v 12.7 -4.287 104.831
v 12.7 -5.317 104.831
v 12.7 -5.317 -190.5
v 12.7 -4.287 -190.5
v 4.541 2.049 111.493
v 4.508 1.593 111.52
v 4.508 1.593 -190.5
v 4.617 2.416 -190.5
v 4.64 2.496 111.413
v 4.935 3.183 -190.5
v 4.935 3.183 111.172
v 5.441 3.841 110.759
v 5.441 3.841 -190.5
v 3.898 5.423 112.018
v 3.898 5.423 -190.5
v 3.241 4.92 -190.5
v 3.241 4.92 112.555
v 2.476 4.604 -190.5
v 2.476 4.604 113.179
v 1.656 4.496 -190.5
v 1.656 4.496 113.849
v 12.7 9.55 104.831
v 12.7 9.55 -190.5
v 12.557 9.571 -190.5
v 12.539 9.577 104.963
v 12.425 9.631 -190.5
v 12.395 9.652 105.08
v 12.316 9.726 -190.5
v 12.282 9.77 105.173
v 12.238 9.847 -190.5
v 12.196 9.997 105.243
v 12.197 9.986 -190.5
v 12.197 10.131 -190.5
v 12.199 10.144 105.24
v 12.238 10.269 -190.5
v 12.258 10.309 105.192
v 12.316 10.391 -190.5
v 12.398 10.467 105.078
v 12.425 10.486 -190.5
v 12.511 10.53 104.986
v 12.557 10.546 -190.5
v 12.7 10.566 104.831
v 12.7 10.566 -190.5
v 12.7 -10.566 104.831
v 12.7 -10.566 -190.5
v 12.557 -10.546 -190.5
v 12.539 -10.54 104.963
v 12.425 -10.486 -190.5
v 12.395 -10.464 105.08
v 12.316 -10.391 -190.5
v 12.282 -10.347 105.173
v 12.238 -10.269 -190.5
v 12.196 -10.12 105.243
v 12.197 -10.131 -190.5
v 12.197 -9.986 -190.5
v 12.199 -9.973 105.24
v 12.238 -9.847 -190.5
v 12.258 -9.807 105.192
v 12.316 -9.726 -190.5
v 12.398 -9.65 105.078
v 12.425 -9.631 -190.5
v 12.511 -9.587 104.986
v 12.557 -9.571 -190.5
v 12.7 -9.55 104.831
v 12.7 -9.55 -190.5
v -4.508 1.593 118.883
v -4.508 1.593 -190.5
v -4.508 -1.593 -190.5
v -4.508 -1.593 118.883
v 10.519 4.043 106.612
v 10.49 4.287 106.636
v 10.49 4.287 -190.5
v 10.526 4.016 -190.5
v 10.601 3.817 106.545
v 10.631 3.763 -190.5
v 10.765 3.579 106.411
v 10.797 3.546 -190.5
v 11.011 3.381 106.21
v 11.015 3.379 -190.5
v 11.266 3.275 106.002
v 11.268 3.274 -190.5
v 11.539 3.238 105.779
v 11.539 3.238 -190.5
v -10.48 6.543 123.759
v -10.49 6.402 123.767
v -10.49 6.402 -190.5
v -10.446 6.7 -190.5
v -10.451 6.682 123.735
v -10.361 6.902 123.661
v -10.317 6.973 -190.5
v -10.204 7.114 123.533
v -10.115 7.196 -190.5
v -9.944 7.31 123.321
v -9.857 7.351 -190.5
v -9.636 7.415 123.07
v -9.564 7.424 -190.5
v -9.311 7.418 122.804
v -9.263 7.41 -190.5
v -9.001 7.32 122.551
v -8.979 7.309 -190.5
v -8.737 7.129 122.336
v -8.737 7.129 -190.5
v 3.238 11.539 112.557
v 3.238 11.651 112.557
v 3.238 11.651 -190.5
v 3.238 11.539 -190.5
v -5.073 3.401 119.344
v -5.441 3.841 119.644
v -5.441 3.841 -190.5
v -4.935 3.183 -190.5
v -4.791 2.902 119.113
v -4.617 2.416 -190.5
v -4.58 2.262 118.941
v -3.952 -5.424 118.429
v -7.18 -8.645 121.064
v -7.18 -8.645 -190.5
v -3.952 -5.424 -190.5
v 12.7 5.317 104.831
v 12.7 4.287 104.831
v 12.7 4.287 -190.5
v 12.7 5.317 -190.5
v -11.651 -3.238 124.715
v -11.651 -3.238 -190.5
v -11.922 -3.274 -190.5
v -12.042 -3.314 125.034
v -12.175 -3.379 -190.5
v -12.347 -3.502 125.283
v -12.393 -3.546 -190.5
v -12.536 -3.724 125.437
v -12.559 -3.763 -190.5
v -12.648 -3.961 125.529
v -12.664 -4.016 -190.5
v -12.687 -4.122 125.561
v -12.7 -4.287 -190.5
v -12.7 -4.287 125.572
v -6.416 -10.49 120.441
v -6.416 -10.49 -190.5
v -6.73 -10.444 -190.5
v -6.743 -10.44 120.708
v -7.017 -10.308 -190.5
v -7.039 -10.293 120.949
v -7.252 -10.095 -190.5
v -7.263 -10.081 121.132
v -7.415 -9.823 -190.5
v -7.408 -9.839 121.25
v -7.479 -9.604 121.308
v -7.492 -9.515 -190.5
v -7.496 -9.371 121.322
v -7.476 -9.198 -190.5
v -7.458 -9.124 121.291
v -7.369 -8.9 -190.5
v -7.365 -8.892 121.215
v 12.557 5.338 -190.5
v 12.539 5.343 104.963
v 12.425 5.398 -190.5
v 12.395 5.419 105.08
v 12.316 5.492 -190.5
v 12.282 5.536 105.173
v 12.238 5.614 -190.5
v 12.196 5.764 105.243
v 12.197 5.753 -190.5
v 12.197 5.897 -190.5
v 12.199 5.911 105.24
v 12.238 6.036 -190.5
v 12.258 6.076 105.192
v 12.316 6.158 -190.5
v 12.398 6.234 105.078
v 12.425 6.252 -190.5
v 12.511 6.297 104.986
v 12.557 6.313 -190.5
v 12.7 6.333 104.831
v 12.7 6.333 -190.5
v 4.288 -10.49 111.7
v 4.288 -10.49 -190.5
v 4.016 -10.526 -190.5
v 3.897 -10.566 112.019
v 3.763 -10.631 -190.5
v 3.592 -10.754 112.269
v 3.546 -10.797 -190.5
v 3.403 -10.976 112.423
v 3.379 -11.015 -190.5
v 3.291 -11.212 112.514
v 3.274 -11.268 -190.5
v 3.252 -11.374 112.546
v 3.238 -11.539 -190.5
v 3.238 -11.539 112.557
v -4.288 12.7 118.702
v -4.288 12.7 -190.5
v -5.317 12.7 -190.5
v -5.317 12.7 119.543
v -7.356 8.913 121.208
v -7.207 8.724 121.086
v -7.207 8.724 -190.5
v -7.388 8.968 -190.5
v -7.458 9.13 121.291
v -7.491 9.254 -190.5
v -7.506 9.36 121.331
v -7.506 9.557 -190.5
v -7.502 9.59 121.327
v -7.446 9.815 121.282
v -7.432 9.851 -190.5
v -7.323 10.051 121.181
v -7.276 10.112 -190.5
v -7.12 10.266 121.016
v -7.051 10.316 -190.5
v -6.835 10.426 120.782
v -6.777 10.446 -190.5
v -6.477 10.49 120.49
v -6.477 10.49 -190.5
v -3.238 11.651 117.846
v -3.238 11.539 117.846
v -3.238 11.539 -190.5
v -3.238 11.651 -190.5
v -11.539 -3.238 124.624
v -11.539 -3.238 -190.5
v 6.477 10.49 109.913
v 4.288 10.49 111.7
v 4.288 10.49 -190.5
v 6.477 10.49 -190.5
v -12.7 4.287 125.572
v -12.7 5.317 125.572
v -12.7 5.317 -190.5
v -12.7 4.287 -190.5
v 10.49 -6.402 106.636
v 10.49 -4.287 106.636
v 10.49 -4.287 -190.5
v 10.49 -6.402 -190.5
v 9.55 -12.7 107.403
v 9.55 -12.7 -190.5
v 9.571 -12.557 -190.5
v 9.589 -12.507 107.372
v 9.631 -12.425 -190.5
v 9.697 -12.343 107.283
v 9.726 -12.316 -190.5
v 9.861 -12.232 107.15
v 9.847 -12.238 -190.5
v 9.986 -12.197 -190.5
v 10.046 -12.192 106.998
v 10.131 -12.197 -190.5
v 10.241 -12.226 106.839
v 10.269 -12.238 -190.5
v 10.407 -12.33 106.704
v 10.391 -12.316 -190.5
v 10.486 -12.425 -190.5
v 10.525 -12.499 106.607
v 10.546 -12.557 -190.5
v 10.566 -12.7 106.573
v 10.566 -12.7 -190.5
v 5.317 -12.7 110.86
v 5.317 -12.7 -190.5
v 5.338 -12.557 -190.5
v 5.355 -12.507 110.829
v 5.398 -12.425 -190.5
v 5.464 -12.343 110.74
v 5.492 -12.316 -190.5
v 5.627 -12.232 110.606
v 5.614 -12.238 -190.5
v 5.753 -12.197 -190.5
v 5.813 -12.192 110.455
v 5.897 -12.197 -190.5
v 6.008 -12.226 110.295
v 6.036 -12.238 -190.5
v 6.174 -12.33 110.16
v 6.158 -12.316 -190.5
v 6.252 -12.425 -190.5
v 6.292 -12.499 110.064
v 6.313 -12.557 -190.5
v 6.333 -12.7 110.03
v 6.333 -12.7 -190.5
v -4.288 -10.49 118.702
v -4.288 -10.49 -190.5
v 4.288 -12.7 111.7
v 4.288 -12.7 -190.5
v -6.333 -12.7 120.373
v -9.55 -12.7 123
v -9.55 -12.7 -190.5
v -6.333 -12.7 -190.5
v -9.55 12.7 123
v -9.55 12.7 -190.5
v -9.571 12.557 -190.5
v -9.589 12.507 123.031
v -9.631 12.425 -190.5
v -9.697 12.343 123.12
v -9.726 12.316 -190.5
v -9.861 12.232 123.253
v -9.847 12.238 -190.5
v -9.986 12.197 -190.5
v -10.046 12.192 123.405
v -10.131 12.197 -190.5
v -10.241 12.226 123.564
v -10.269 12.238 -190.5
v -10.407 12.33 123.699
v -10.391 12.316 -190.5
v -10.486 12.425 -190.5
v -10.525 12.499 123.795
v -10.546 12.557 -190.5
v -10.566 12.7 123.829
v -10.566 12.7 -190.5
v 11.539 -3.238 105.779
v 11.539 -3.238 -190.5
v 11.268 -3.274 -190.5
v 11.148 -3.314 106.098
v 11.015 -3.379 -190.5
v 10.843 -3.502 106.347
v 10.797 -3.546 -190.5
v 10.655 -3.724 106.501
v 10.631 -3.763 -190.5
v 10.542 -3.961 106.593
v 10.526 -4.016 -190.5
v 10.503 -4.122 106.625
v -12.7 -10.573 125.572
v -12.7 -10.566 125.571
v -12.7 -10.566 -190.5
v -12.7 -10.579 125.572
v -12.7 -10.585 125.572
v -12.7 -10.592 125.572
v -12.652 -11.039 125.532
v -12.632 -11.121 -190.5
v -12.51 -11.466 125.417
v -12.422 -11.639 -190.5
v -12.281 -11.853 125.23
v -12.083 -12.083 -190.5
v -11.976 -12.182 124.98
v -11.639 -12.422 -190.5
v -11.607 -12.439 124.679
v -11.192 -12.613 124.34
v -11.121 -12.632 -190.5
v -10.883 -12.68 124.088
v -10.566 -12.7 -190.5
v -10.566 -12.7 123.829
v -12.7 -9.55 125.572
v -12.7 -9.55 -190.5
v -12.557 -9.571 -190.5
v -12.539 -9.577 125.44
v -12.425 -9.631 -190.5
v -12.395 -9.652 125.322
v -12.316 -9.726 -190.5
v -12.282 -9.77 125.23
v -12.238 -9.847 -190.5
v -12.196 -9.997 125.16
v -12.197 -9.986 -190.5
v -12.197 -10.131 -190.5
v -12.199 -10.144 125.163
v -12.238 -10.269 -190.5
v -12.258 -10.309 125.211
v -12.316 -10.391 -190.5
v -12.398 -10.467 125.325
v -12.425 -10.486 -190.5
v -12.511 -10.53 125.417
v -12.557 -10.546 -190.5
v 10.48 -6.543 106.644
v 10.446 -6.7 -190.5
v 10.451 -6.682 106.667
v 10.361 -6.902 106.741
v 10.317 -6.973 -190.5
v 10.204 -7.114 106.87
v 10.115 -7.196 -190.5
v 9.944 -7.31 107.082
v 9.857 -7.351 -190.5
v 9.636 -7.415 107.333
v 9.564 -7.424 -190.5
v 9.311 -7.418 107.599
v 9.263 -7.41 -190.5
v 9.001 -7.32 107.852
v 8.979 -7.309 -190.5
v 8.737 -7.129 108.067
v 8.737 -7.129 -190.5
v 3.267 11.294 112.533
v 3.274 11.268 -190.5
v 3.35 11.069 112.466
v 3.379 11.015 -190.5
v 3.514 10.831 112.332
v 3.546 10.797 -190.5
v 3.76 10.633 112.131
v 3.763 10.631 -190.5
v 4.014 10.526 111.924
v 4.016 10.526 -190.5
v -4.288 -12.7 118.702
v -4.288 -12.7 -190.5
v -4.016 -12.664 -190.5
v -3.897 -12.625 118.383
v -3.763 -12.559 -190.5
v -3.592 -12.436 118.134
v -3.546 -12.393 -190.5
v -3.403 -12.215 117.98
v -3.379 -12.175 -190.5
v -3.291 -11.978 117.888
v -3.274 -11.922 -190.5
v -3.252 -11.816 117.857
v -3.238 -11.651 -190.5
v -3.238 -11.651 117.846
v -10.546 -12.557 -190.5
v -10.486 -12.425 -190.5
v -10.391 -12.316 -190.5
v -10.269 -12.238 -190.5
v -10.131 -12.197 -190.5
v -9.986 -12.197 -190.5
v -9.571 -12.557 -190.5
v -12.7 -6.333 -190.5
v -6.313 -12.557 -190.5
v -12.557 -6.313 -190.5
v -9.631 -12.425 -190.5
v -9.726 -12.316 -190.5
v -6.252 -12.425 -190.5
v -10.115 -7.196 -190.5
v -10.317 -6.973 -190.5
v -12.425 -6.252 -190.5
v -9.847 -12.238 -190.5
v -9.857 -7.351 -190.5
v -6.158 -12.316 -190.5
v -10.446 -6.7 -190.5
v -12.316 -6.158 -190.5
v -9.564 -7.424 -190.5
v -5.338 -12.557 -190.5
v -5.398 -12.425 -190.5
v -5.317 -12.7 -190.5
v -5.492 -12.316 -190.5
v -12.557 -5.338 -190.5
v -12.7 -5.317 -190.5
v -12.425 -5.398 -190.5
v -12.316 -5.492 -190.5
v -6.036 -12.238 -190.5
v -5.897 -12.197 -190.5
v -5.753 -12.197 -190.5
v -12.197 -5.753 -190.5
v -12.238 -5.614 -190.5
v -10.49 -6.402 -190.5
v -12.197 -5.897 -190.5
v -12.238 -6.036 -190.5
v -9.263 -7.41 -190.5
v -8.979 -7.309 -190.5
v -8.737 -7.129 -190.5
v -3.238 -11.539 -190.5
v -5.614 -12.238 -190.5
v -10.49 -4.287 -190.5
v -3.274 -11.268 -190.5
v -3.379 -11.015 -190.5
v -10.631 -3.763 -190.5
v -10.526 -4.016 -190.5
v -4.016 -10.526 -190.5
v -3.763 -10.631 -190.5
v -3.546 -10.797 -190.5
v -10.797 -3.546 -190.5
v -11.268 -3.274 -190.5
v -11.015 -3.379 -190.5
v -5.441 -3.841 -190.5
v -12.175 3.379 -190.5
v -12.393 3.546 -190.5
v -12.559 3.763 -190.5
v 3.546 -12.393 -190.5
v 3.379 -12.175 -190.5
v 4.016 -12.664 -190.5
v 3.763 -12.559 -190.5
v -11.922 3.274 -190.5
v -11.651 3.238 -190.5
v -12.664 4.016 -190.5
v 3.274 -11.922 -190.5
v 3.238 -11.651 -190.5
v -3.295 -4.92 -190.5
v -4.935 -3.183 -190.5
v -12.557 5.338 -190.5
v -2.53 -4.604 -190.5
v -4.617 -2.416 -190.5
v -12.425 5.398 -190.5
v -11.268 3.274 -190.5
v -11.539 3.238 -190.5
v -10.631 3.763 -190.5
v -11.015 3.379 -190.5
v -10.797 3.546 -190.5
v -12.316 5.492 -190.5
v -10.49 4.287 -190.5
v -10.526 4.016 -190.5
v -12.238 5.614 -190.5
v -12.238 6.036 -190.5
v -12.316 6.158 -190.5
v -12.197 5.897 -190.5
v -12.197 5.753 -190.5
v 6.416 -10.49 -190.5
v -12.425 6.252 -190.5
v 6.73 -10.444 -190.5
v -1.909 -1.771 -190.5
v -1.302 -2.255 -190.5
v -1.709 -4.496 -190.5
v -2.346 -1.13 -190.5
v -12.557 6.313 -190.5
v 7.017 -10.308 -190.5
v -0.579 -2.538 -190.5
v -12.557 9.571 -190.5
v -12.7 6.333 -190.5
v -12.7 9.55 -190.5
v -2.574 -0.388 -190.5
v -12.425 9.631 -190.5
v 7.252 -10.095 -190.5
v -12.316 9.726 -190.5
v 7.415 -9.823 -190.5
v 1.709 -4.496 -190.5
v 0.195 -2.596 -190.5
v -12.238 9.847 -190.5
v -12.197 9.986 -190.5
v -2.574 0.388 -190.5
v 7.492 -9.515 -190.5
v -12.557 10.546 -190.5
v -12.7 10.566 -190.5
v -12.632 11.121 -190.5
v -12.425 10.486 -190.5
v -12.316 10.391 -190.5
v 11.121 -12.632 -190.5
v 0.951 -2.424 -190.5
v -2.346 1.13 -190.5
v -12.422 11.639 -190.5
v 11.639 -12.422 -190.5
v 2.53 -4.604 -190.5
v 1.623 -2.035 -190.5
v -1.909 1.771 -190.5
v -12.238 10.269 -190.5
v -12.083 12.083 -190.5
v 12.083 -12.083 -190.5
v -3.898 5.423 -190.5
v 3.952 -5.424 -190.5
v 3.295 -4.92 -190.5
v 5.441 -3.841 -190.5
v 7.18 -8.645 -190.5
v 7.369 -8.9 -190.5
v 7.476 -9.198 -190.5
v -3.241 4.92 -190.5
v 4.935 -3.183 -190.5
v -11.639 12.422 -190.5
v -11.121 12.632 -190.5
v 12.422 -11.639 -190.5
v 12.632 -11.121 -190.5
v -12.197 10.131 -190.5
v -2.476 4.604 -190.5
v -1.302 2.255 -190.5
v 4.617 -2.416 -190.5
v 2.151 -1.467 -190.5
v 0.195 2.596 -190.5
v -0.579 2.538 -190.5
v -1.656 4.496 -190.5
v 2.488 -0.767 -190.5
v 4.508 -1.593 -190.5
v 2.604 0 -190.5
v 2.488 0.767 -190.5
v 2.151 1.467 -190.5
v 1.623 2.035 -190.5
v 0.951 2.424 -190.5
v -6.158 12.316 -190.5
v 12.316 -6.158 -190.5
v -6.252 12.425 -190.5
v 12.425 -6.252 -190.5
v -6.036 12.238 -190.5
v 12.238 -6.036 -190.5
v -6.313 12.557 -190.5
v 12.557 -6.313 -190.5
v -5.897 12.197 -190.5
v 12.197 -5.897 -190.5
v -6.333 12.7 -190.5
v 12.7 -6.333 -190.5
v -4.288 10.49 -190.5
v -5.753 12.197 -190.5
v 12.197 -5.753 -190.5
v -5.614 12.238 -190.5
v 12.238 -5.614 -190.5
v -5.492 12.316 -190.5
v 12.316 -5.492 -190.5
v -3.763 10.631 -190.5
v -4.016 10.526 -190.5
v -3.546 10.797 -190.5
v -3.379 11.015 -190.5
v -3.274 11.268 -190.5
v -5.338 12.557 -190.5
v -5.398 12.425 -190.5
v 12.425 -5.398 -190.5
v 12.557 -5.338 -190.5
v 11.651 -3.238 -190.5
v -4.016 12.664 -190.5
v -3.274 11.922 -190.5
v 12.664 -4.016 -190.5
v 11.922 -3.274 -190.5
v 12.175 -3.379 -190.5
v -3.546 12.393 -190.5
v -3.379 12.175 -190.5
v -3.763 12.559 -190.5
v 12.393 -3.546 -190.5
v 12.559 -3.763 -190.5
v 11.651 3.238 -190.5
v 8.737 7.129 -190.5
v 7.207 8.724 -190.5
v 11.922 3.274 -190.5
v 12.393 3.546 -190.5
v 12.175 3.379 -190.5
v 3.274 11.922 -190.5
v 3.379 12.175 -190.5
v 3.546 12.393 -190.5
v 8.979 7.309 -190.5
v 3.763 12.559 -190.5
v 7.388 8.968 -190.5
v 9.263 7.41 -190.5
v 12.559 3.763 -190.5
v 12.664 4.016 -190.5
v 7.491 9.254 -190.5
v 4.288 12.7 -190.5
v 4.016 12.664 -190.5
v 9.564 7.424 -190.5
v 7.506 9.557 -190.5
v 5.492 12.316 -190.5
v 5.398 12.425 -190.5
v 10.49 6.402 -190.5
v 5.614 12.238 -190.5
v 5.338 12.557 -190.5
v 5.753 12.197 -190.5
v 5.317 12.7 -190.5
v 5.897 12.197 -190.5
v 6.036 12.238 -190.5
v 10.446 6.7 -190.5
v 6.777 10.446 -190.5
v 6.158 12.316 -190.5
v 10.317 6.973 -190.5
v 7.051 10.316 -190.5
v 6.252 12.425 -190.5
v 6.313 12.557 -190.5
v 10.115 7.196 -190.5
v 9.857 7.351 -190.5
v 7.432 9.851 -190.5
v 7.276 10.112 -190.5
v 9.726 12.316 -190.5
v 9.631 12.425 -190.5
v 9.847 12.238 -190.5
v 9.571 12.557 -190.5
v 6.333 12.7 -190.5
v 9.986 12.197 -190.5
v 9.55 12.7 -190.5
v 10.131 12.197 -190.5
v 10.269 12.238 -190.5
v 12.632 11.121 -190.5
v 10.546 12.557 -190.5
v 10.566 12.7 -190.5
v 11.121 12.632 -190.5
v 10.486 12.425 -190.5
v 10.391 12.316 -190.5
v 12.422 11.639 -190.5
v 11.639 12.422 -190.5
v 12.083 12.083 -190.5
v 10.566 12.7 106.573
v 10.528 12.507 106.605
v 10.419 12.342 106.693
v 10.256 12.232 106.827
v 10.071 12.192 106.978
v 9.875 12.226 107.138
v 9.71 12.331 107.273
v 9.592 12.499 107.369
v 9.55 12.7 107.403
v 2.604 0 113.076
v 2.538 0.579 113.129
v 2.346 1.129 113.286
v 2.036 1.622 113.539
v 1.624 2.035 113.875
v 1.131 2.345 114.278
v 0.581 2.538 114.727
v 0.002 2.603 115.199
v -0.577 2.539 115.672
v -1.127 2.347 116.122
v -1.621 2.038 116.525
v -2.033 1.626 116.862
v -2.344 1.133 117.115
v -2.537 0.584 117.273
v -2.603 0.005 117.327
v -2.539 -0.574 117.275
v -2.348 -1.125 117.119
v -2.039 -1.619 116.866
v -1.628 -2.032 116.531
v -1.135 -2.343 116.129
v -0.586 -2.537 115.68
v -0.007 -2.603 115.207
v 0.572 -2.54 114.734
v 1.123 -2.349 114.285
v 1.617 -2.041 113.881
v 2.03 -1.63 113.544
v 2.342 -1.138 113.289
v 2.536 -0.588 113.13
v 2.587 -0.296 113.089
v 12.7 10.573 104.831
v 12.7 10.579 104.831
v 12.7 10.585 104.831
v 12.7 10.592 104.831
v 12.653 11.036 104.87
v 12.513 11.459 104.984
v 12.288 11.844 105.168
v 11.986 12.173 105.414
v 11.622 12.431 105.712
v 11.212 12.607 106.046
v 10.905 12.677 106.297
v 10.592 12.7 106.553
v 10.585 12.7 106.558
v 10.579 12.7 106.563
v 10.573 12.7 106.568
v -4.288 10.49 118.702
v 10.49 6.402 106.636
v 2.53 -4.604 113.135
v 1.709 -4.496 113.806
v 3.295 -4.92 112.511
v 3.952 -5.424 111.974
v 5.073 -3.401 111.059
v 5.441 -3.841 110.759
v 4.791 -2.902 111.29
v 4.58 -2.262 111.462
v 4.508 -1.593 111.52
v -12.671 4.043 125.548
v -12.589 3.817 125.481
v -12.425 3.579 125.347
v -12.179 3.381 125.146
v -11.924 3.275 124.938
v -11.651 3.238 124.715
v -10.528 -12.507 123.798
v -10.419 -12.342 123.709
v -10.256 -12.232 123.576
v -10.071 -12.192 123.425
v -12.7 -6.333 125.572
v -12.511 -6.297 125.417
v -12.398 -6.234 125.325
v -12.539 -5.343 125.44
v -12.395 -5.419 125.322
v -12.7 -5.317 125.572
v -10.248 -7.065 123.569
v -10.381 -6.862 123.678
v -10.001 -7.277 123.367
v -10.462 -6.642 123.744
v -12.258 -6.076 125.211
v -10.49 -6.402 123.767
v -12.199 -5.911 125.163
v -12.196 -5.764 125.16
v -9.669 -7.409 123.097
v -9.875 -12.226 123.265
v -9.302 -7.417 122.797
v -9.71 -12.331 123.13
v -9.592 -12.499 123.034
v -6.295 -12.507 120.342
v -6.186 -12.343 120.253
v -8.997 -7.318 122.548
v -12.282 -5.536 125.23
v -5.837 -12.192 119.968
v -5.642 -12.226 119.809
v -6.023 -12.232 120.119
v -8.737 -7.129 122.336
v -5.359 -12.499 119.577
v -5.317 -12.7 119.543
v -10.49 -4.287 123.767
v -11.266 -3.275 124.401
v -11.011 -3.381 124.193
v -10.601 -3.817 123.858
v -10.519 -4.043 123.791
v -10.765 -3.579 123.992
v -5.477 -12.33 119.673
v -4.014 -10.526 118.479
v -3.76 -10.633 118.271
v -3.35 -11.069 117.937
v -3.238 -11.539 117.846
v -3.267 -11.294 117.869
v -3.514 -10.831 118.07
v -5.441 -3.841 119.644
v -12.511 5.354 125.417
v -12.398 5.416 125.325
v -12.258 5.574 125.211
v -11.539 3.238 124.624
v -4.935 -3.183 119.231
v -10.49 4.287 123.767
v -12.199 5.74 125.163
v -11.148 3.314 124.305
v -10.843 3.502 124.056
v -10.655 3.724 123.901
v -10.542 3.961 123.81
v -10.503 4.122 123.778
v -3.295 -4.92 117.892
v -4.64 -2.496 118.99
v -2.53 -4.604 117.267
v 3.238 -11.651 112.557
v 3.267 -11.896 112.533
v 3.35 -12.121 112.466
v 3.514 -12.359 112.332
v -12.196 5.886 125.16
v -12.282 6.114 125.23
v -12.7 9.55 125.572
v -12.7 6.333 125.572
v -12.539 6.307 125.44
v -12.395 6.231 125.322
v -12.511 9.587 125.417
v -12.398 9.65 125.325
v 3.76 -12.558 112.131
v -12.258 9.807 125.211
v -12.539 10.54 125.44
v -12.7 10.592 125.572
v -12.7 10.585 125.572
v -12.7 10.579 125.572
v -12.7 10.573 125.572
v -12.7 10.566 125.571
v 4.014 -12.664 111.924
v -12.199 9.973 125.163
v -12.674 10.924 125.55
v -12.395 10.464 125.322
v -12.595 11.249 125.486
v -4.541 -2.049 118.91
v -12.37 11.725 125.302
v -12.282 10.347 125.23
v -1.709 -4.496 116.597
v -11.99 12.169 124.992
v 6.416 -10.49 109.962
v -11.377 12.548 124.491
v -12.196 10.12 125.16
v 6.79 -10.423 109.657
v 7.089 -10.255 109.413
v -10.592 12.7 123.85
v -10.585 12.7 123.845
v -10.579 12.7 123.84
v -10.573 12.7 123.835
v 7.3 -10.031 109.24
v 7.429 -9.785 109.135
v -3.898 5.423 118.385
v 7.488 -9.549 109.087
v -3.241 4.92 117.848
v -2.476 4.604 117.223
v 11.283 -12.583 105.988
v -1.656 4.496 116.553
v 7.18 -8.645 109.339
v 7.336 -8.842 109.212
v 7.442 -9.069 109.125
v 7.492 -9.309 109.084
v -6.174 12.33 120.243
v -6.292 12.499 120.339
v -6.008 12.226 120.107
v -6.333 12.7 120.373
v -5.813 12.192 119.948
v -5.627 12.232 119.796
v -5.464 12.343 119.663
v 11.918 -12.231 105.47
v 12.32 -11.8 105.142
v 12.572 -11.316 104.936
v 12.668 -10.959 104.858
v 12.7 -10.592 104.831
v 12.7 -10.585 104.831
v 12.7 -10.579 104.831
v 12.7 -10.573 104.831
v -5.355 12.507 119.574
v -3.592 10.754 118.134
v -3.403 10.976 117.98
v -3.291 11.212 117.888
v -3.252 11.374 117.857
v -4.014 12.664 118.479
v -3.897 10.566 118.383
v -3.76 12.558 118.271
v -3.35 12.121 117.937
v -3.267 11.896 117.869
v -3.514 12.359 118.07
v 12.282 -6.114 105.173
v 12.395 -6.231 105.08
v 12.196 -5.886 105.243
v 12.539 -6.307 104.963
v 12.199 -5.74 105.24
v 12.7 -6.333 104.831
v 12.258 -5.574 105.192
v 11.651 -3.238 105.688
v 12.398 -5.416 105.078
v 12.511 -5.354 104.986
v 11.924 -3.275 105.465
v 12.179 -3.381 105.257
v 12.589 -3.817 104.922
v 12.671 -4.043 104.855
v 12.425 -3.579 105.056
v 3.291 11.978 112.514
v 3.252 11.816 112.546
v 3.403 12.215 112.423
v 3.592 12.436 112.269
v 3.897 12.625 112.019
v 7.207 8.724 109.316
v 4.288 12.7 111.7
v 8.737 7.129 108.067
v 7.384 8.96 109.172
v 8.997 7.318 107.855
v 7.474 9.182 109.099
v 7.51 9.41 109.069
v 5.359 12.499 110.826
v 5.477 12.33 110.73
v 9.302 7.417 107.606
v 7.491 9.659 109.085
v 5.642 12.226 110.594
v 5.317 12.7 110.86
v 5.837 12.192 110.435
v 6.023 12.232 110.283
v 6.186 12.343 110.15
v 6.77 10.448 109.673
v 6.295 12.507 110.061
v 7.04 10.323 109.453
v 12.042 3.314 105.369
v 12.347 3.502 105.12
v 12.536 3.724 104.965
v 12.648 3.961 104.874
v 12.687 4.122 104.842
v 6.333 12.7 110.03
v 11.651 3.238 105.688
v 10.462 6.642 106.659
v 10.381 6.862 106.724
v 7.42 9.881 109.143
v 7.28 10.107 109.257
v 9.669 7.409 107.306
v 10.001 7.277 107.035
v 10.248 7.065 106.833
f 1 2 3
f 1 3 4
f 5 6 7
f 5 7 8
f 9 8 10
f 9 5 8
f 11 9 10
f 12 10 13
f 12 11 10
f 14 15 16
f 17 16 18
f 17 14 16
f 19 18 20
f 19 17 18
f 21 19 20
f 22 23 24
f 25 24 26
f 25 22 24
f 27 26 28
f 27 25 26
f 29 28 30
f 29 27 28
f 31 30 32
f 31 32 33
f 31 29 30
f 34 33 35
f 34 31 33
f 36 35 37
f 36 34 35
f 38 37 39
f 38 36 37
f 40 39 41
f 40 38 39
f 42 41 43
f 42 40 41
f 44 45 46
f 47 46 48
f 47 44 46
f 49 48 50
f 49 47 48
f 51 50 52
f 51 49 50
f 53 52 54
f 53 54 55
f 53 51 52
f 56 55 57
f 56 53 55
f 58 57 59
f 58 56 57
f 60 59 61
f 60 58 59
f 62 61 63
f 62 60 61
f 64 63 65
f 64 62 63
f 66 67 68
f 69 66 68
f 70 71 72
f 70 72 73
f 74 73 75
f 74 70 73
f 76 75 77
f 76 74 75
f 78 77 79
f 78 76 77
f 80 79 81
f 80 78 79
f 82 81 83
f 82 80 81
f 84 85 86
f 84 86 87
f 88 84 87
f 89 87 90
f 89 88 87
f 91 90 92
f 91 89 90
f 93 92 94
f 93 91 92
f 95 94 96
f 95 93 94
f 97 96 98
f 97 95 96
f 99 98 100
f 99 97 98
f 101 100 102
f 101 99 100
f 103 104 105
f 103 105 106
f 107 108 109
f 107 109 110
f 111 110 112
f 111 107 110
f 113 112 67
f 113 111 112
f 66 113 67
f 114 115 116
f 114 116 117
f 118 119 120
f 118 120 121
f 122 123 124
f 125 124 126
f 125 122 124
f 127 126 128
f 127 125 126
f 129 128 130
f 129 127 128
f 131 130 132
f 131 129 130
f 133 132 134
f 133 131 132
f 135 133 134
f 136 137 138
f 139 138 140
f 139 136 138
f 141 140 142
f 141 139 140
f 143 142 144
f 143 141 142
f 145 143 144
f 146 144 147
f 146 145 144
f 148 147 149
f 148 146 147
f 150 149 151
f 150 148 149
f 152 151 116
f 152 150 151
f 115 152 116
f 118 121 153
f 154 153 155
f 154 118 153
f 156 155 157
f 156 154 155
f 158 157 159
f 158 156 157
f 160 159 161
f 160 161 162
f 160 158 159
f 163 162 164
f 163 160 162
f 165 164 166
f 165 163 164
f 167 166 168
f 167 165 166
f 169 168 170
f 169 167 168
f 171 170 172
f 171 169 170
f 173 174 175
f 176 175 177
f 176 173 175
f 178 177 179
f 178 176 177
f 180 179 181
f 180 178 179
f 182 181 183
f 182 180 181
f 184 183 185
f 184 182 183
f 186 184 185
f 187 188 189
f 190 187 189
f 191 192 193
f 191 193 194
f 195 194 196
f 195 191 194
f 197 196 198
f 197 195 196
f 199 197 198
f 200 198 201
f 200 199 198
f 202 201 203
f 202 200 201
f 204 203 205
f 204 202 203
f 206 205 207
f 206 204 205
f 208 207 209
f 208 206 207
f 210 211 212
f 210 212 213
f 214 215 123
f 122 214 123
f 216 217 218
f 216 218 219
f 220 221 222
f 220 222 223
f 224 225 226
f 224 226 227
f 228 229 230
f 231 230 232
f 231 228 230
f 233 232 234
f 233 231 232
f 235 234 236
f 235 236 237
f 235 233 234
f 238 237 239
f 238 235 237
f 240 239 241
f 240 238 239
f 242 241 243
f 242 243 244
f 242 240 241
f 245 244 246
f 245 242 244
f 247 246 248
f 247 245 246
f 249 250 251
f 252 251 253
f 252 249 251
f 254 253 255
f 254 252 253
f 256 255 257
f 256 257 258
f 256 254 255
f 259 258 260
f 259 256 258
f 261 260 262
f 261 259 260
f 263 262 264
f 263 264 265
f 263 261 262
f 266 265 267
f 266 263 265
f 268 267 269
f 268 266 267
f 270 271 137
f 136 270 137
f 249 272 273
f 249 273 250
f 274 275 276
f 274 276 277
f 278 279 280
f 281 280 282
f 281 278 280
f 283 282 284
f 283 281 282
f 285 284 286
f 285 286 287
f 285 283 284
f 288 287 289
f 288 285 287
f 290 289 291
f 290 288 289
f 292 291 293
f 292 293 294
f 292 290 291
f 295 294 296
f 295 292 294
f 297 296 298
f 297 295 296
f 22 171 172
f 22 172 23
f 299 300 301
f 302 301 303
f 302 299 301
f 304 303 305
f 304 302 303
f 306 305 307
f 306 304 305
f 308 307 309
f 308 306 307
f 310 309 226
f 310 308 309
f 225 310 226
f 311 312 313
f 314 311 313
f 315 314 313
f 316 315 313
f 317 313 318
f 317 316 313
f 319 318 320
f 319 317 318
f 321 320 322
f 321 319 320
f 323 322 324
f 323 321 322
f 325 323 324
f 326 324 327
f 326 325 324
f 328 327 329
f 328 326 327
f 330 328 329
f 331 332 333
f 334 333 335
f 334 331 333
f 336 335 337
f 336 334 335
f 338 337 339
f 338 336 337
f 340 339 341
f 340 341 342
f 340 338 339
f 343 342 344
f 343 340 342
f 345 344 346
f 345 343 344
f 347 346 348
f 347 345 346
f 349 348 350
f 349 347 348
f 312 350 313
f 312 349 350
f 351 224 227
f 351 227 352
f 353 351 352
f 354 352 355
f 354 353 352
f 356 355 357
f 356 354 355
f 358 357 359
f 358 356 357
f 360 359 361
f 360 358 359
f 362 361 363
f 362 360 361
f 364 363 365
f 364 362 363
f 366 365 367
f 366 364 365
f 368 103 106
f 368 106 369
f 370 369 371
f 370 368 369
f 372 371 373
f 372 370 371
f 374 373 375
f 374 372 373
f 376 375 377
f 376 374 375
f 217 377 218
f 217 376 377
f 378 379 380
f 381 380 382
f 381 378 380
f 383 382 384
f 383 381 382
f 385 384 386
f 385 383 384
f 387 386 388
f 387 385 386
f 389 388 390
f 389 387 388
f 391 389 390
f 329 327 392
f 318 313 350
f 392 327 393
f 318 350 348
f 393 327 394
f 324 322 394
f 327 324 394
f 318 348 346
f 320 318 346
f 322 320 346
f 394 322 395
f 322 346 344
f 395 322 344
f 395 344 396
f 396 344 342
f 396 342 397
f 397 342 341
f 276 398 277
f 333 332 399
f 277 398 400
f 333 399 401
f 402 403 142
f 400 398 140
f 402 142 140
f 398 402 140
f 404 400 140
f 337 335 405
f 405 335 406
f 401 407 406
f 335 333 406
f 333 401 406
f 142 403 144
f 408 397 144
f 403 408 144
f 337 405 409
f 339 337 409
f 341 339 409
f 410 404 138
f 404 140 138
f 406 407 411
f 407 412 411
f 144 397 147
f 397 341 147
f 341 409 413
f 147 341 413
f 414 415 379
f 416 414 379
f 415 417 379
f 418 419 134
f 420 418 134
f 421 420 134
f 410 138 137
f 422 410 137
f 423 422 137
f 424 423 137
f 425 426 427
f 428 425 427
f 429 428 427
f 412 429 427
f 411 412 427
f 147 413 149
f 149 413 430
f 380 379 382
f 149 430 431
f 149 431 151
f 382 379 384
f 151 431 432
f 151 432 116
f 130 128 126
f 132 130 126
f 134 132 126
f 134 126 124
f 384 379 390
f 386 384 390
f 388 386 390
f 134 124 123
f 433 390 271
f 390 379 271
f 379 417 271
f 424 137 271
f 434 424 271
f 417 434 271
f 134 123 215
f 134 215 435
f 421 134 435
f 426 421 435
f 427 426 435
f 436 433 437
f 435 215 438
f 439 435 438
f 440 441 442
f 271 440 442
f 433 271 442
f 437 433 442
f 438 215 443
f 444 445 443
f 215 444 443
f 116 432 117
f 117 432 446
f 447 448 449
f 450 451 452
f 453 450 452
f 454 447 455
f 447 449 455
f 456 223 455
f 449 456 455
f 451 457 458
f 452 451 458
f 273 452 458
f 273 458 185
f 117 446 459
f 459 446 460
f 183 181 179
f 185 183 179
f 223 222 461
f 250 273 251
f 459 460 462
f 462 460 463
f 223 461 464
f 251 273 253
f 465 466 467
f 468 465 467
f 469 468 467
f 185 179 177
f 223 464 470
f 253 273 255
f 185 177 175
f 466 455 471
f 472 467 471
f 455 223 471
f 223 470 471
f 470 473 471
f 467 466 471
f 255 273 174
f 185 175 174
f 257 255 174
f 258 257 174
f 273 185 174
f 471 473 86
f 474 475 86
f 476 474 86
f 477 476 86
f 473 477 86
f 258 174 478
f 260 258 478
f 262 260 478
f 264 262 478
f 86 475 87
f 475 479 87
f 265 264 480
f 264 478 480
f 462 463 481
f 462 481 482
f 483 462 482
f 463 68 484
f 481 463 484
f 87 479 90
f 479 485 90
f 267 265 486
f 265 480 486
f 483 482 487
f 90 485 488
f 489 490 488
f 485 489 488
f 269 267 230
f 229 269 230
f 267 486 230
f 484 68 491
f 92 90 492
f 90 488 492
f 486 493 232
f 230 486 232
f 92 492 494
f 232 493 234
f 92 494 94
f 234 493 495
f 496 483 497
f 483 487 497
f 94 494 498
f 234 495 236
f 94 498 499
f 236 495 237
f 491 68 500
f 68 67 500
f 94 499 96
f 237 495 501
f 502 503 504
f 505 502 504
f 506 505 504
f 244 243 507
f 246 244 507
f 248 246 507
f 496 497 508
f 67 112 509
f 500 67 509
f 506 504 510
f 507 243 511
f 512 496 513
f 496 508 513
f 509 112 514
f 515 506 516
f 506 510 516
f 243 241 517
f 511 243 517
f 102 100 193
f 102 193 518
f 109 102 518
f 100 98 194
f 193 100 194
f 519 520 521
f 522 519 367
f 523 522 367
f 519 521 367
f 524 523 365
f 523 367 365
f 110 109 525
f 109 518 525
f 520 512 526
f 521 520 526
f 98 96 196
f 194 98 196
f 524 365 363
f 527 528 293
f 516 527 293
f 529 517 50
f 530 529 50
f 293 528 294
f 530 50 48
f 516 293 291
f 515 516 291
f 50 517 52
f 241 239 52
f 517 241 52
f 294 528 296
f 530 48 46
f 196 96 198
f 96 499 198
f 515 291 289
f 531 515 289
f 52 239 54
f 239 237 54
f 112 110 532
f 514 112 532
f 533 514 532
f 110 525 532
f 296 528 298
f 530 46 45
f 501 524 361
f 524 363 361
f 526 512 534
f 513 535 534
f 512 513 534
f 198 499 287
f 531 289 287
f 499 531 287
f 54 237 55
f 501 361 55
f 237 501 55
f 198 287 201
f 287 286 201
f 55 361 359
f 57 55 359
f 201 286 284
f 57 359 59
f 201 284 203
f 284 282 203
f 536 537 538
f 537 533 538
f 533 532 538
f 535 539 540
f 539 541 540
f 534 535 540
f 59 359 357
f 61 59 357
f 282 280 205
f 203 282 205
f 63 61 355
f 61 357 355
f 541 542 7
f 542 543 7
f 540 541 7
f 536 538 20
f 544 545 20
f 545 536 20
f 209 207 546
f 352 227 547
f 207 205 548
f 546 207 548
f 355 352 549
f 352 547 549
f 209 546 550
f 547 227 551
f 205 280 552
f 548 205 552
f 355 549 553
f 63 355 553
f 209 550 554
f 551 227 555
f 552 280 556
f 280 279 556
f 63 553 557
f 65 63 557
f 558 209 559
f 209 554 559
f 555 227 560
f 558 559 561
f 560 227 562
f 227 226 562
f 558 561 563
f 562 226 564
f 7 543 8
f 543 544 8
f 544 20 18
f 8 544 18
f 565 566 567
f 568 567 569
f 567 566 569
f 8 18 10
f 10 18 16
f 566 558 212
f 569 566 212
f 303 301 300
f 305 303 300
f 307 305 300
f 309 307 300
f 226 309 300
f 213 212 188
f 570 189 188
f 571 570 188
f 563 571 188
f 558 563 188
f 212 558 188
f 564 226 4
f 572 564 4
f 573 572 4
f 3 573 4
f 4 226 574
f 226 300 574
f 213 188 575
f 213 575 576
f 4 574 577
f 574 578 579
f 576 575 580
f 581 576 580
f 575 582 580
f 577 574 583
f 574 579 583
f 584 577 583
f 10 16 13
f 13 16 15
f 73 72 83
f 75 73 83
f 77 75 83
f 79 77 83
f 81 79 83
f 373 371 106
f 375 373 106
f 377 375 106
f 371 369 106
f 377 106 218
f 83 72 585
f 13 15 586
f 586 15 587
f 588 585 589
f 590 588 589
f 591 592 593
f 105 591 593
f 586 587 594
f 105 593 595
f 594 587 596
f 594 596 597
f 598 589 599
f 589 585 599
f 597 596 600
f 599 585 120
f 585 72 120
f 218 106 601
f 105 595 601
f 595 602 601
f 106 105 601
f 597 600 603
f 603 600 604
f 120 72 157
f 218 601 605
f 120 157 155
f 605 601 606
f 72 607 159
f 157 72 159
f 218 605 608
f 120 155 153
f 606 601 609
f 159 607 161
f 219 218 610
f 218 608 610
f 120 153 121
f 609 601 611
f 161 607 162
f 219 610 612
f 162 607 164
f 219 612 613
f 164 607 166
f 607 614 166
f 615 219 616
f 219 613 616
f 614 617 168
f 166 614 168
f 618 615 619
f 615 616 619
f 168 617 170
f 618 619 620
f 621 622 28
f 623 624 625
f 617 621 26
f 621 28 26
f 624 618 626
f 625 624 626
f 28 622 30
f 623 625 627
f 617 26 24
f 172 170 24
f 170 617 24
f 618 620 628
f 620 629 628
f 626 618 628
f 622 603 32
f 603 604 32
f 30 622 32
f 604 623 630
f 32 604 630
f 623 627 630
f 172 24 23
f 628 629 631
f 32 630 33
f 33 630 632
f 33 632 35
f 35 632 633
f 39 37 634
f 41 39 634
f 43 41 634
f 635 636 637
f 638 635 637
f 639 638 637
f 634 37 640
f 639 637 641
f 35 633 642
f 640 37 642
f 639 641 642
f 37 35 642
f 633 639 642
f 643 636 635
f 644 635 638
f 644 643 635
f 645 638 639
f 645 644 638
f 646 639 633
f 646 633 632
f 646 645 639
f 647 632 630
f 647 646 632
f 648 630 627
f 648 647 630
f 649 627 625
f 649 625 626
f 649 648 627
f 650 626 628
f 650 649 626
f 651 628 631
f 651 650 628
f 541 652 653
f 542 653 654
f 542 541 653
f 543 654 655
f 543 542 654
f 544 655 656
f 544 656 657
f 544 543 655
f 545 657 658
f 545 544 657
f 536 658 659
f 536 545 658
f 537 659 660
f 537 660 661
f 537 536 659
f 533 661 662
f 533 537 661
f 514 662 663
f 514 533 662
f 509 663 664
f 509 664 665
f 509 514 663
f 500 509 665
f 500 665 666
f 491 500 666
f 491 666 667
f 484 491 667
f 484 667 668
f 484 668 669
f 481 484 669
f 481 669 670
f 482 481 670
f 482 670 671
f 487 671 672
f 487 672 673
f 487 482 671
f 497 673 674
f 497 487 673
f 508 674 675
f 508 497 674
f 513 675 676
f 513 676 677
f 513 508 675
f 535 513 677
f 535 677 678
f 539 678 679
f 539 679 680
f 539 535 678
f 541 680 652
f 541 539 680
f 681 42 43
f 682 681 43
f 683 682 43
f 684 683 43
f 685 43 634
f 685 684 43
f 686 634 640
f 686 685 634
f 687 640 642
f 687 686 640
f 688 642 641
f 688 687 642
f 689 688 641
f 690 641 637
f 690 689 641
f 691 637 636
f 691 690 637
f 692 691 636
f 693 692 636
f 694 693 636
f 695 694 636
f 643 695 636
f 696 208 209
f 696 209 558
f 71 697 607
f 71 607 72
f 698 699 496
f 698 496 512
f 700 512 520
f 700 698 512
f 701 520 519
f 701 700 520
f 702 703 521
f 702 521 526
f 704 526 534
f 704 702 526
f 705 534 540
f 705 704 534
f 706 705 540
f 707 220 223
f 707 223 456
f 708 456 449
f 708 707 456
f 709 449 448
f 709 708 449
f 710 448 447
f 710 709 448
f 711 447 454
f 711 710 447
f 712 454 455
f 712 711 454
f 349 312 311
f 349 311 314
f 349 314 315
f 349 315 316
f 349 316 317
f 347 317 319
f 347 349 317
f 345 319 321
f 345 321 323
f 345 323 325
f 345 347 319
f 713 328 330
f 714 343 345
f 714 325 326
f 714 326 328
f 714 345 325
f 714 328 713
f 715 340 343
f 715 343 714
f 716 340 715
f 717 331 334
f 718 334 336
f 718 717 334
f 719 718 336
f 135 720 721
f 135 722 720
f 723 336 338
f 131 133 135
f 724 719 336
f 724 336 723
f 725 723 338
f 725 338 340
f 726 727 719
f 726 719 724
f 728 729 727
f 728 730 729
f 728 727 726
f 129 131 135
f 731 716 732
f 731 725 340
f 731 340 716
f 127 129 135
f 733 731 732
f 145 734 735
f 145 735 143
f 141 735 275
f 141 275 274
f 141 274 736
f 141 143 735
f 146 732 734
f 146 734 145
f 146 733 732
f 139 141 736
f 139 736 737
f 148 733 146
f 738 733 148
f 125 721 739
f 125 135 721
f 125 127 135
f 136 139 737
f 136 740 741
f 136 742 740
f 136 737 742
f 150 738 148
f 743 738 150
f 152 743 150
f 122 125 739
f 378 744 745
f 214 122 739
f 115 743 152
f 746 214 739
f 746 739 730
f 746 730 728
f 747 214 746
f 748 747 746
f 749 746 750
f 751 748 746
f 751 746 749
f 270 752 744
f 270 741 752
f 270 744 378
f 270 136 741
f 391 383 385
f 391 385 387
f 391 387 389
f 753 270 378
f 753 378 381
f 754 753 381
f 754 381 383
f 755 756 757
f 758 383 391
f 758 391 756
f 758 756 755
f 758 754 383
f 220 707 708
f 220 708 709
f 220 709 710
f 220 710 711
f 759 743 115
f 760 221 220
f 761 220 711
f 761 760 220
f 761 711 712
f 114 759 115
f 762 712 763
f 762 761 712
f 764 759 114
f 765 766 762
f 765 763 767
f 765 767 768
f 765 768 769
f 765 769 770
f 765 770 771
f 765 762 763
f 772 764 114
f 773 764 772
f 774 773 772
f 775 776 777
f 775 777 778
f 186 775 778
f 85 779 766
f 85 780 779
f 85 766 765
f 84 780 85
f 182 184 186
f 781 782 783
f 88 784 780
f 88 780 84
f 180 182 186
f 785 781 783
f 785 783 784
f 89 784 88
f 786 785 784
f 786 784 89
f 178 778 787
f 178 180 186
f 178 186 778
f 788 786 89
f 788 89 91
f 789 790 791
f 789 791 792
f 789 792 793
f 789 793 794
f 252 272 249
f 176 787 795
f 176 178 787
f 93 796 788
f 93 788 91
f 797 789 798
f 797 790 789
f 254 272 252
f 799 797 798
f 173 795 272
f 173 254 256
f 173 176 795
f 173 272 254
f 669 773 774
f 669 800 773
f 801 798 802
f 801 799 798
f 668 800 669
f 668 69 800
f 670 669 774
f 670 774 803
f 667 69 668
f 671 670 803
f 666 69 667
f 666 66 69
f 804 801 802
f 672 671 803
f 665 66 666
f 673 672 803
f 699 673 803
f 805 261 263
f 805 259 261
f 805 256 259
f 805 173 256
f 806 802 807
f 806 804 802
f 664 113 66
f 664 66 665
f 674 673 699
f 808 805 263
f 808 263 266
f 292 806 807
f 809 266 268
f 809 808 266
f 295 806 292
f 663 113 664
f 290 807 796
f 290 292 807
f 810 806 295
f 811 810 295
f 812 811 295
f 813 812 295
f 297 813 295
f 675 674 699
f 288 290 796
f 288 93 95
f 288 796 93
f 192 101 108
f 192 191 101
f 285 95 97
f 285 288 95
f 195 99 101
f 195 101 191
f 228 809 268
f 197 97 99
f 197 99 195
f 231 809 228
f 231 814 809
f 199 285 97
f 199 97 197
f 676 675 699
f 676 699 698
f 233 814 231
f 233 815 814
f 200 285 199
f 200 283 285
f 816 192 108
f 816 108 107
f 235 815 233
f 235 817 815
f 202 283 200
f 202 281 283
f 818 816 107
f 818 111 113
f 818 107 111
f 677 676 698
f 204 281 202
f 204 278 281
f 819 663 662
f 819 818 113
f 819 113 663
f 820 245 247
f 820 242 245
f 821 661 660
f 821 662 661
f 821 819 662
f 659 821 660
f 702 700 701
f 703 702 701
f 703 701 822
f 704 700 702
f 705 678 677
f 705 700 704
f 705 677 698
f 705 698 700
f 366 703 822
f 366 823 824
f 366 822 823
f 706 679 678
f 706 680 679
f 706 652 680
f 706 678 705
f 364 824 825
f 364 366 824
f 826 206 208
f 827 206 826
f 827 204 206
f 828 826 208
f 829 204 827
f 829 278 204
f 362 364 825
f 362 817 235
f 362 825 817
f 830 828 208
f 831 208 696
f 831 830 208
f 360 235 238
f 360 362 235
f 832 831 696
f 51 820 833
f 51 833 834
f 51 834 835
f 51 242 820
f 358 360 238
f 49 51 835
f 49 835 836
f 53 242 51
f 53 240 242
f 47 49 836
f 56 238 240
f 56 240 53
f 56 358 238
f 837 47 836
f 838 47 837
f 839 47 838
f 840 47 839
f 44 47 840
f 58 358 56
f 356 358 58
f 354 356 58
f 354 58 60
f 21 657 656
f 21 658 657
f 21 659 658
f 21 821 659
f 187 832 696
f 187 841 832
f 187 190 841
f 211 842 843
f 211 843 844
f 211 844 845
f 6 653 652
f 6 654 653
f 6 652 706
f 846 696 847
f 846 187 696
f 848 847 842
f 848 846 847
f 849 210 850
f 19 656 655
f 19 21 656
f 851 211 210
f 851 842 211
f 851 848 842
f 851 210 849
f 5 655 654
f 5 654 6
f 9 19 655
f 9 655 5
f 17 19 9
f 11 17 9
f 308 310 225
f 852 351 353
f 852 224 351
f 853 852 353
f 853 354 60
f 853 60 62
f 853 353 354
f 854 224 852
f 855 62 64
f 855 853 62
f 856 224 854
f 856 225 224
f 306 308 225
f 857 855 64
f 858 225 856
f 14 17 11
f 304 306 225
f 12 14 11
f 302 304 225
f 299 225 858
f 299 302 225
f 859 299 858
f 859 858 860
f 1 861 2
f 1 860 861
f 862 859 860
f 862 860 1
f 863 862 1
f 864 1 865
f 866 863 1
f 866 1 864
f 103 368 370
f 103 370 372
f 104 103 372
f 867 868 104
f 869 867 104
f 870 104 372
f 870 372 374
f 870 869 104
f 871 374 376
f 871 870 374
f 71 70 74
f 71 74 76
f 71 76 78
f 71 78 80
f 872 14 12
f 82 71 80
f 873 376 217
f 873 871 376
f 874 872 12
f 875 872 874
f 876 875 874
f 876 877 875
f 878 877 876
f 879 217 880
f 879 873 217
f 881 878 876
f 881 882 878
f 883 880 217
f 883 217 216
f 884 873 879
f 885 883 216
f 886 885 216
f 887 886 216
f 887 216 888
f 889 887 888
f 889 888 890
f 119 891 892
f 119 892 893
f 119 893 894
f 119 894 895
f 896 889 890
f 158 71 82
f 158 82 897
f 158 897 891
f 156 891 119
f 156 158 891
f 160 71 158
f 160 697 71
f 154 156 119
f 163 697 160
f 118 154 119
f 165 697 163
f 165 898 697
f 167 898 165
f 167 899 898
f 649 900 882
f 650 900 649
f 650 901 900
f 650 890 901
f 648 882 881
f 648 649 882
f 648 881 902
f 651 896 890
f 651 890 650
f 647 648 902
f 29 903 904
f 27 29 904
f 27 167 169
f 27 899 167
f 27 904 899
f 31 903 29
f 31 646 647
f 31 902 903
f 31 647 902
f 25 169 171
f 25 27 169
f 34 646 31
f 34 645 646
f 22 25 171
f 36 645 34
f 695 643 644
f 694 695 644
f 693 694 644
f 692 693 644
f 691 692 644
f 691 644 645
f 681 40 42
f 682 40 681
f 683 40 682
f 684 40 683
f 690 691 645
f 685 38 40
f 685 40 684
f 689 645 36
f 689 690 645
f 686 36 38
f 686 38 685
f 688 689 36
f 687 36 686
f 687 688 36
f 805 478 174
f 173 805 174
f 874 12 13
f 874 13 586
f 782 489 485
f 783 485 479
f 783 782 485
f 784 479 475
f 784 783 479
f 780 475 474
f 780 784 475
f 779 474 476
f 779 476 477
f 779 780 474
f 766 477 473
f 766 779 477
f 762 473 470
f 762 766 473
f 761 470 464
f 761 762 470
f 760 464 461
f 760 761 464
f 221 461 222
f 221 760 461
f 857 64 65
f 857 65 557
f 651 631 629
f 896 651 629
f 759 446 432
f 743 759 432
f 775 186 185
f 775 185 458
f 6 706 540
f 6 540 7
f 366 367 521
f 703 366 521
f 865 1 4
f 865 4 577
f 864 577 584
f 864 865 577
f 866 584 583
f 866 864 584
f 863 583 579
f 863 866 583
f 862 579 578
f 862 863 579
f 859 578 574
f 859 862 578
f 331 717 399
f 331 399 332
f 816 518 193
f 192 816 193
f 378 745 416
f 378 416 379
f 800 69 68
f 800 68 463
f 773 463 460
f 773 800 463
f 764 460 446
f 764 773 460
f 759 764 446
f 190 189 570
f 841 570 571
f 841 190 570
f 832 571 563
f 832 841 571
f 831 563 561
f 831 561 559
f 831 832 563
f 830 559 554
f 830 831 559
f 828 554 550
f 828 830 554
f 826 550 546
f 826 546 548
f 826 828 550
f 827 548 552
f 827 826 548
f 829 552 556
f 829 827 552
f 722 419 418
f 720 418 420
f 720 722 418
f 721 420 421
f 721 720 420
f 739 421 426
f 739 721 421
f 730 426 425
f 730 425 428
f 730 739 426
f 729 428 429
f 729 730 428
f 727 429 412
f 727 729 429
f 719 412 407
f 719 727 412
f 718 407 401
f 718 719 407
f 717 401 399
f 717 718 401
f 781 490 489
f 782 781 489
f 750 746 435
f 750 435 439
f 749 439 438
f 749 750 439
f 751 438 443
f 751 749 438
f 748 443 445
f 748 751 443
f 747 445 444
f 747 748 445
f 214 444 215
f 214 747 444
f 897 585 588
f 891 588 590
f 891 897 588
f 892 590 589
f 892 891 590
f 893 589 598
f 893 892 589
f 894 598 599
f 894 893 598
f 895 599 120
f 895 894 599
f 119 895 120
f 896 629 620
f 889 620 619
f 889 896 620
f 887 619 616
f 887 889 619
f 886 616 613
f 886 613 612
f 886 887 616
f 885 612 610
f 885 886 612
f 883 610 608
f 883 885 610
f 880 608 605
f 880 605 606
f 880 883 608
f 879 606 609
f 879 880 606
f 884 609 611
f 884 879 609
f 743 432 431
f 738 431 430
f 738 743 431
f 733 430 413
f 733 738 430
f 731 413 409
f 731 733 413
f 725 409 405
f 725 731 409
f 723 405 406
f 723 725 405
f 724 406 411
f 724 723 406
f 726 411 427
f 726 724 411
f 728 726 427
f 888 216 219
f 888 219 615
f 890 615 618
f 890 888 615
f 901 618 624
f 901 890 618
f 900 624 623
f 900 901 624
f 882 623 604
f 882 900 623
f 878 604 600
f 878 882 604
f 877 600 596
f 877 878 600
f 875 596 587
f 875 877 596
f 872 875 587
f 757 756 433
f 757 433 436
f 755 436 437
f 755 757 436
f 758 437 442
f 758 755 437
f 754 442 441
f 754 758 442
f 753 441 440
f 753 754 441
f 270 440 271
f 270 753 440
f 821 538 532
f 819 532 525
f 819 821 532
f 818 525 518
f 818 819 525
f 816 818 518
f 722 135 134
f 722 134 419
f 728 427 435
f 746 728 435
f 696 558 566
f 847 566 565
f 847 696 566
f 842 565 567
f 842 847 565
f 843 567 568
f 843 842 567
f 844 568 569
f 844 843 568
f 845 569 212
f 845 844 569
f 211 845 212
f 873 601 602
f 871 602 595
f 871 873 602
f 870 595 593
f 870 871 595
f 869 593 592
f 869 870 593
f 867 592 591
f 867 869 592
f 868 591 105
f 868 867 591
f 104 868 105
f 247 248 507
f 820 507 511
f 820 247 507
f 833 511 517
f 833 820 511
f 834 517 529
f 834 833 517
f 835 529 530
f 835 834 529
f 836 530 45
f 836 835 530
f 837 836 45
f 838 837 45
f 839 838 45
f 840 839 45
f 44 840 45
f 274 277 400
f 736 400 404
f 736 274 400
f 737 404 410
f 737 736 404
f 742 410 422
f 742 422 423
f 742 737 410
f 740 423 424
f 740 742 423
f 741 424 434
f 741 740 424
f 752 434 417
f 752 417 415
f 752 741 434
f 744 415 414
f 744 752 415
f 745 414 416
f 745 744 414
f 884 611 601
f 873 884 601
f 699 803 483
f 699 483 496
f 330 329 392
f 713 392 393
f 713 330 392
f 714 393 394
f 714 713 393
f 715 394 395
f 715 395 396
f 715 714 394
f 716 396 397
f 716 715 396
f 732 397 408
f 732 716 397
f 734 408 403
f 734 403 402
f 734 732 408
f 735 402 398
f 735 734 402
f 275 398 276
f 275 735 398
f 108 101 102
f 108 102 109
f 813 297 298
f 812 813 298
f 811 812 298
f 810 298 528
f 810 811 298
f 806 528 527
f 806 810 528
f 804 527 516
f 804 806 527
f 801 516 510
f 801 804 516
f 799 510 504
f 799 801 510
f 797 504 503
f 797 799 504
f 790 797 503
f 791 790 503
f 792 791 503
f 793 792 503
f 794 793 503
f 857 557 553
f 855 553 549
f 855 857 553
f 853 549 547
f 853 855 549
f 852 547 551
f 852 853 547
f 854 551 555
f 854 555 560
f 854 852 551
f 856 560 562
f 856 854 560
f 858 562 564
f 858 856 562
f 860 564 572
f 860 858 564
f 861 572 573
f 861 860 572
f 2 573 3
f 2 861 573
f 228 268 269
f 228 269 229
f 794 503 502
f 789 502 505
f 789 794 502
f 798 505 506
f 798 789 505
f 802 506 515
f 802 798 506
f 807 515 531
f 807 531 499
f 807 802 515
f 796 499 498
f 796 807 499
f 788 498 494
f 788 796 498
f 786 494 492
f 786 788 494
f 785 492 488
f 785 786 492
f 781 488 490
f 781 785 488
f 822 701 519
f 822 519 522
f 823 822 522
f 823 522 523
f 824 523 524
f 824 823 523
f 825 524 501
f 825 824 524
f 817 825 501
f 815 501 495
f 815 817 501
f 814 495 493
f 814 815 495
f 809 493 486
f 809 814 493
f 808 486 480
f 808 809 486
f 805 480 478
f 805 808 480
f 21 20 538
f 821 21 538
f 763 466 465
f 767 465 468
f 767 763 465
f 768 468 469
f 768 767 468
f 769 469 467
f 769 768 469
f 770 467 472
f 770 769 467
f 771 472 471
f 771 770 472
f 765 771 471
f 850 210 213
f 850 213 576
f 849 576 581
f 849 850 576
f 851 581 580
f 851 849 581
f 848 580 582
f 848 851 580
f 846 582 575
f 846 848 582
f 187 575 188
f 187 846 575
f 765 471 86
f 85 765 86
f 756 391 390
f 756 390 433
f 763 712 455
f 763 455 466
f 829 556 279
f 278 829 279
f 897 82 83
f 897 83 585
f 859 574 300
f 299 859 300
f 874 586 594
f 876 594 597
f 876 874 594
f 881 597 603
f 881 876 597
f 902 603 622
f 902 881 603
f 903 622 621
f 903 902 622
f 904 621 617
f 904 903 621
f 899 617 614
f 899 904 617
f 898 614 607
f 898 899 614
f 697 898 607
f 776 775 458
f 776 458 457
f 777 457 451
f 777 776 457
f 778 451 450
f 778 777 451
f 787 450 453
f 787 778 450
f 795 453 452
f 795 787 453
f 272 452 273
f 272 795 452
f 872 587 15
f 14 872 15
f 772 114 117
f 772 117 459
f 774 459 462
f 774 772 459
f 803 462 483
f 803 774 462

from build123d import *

# Parameters (mm, degrees)
SKETCH1_R           = 2.6035
BOSS_EXTRUDE1_DEPTH = 190.5
CUT_EXTRUDE1_DEPTH  = 193.605036279


with BuildPart() as part:
    # Sketch1 → Boss-Extrude1 (new, symmetric)
    with BuildSketch(Plane.XY):
        with BuildLine():
            Line((-7.179650497, -8.645192506), (-3.952270251, -5.423690499))
            ThreePointArc((-3.952270251, -5.423690499), (-2.922936451, -4.736929036), (-1.709253557, -4.4958))
            Line((-1.709253557, -4.4958), (1.709253557, -4.4958))
            ThreePointArc((1.709253557, -4.4958), (2.922936451, -4.736929036), (3.952270251, -5.423690499))
            Line((3.952270251, -5.423690499), (7.179650497, -8.645192506))
            ThreePointArc((7.179650497, -8.645192506), (7.41473083, -9.822813117), (6.416408329, -10.4902))
            Line((6.416408329, -10.4902), (4.287512407, -10.4902))
            ThreePointArc((4.287512407, -10.4902), (3.54574862, -10.79744862), (3.2385, -11.539212407))
            Line((3.2385, -11.539212407), (3.2385, -11.650987593))
            ThreePointArc((3.2385, -11.650987593), (3.54574862, -12.39275138), (4.287512407, -12.7))
            Line((4.287512407, -12.7), (5.317126718, -12.7))
            ThreePointArc((5.317126718, -12.7), (5.825126718, -12.192), (6.333126718, -12.7))
            Line((6.333126718, -12.7), (9.550443118, -12.7))
            ThreePointArc((9.550443118, -12.7), (10.058366869, -12.192000006), (10.566443095, -12.699847501))
            ThreePointArc((10.566443095, -12.699847501), (12.082537762, -12.08250727), (12.699846982, -10.566399977))
            ThreePointArc((12.699846982, -10.566399977), (12.192000006, -10.058323491), (12.7, -9.5504))
            Line((12.7, -9.5504), (12.7, -6.3330836))
            ThreePointArc((12.7, -6.3330836), (12.192, -5.8250836), (12.7, -5.3170836))
            Line((12.7, -5.3170836), (12.7, -4.287469289))
            ThreePointArc((12.7, -4.287469289), (12.39275138, -3.545705502), (11.650987593, -3.238456882))
            Line((11.650987593, -3.238456882), (11.539212407, -3.238456882))
            ThreePointArc((11.539212407, -3.238456882), (10.79744862, -3.545705502), (10.4902, -4.287469289))
            Line((10.4902, -4.287469289), (10.4902, -6.402089023))
            ThreePointArc((10.4902, -6.402089023), (9.856505071, -7.351067942), (8.737131347, -7.129408934))
            Line((8.737131347, -7.129408934), (5.441005833, -3.840816462))
            ThreePointArc((5.441005833, -3.840816462), (4.750877967, -2.809883091), (4.5085, -1.593185507))
            Line((4.5085, -1.593185507), (4.5085, 1.593185507))
            ThreePointArc((4.5085, 1.593185507), (4.750877967, 2.809883091), (5.441005833, 3.840816462))
            Line((5.441005833, 3.840816462), (8.737131347, 7.129408934))
            ThreePointArc((8.737131347, 7.129408934), (9.856505071, 7.351067942), (10.4902, 6.402089023))
            Line((10.4902, 6.402089023), (10.4902, 4.287469289))
            ThreePointArc((10.4902, 4.287469289), (10.79744862, 3.545705502), (11.539212407, 3.238456882))
            Line((11.539212407, 3.238456882), (11.650987593, 3.238456882))
            ThreePointArc((11.650987593, 3.238456882), (12.39275138, 3.545705502), (12.7, 4.287469289))
            Line((12.7, 4.287469289), (12.7, 5.3170836))
            ThreePointArc((12.7, 5.3170836), (12.192, 5.8250836), (12.7, 6.3330836))
            Line((12.7, 6.3330836), (12.7, 9.5504))
            ThreePointArc((12.7, 9.5504), (12.192000006, 10.058323491), (12.699846982, 10.566399977))
            ThreePointArc((12.699846982, 10.566399977), (12.082537762, 12.08250727), (10.566443095, 12.699847501))
            ThreePointArc((10.566443095, 12.699847501), (10.058366869, 12.192000006), (9.550443118, 12.7))
            Line((9.550443118, 12.7), (6.333126718, 12.7))
            ThreePointArc((6.333126718, 12.7), (5.825126718, 12.192), (5.317126718, 12.7))
            Line((5.317126718, 12.7), (4.287512407, 12.7))
            ThreePointArc((4.287512407, 12.7), (3.54574862, 12.39275138), (3.2385, 11.650987593))
            Line((3.2385, 11.650987593), (3.2385, 11.539212407))
            ThreePointArc((3.2385, 11.539212407), (3.54574862, 10.79744862), (4.287512407, 10.4902))
            Line((4.287512407, 10.4902), (6.476788598, 10.4902))
            ThreePointArc((6.476788598, 10.4902), (7.432222385, 9.85140422), (7.207036008, 8.724370562))
            Line((7.207036008, 8.724370562), (3.898272566, 5.423169045))
            ThreePointArc((3.898272566, 5.423169045), (2.869120213, 4.736787962), (1.655778399, 4.4958))
            Line((1.655778399, 4.4958), (-1.655778399, 4.4958))
            ThreePointArc((-1.655778399, 4.4958), (-2.869120213, 4.736787962), (-3.898272566, 5.423169045))
            Line((-3.898272566, 5.423169045), (-7.207036008, 8.724370562))
            ThreePointArc((-7.207036008, 8.724370562), (-7.432222385, 9.85140422), (-6.476788598, 10.4902))
            Line((-6.476788598, 10.4902), (-4.287512407, 10.4902))
            ThreePointArc((-4.287512407, 10.4902), (-3.54574862, 10.79744862), (-3.2385, 11.539212407))
            Line((-3.2385, 11.539212407), (-3.2385, 11.650987593))
            ThreePointArc((-3.2385, 11.650987593), (-3.54574862, 12.39275138), (-4.287512407, 12.7))
            Line((-4.287512407, 12.7), (-5.317126718, 12.7))
            ThreePointArc((-5.317126718, 12.7), (-5.825126718, 12.192), (-6.333126718, 12.7))
            Line((-6.333126718, 12.7), (-9.550443118, 12.7))
            ThreePointArc((-9.550443118, 12.7), (-10.058366869, 12.192000006), (-10.566443095, 12.699847501))
            ThreePointArc((-10.566443095, 12.699847501), (-12.082537762, 12.08250727), (-12.699846982, 10.566399977))
            ThreePointArc((-12.699846982, 10.566399977), (-12.192000006, 10.058323491), (-12.7, 9.5504))
            Line((-12.7, 9.5504), (-12.7, 6.3330836))
            ThreePointArc((-12.7, 6.3330836), (-12.192, 5.8250836), (-12.7, 5.3170836))
            Line((-12.7, 5.3170836), (-12.7, 4.287469289))
            ThreePointArc((-12.7, 4.287469289), (-12.39275138, 3.545705502), (-11.650987593, 3.238456882))
            Line((-11.650987593, 3.238456882), (-11.539212407, 3.238456882))
            ThreePointArc((-11.539212407, 3.238456882), (-10.79744862, 3.545705502), (-10.4902, 4.287469289))
            Line((-10.4902, 4.287469289), (-10.4902, 6.402089023))
            ThreePointArc((-10.4902, 6.402089023), (-9.856505071, 7.351067942), (-8.737131347, 7.129408934))
            Line((-8.737131347, 7.129408934), (-5.441005833, 3.840816462))
            ThreePointArc((-5.441005833, 3.840816462), (-4.750877967, 2.809883091), (-4.5085, 1.593185507))
            Line((-4.5085, 1.593185507), (-4.5085, -1.593185507))
            ThreePointArc((-4.5085, -1.593185507), (-4.750877967, -2.809883091), (-5.441005833, -3.840816462))
            Line((-5.441005833, -3.840816462), (-8.737131347, -7.129408934))
            ThreePointArc((-8.737131347, -7.129408934), (-9.856505071, -7.351067942), (-10.4902, -6.402089023))
            Line((-10.4902, -6.402089023), (-10.4902, -4.287469289))
            ThreePointArc((-10.4902, -4.287469289), (-10.79744862, -3.545705502), (-11.539212407, -3.238456882))
            Line((-11.539212407, -3.238456882), (-11.650987593, -3.238456882))
            ThreePointArc((-11.650987593, -3.238456882), (-12.39275138, -3.545705502), (-12.7, -4.287469289))
            Line((-12.7, -4.287469289), (-12.7, -5.3170836))
            ThreePointArc((-12.7, -5.3170836), (-12.192, -5.8250836), (-12.7, -6.3330836))
            Line((-12.7, -6.3330836), (-12.7, -9.5504))
            ThreePointArc((-12.7, -9.5504), (-12.192000006, -10.058323491), (-12.699846982, -10.566399977))
            ThreePointArc((-12.699846982, -10.566399977), (-12.082537762, -12.08250727), (-10.566443095, -12.699847501))
            ThreePointArc((-10.566443095, -12.699847501), (-10.058366869, -12.192000006), (-9.550443118, -12.7))
            Line((-9.550443118, -12.7), (-6.333126718, -12.7))
            ThreePointArc((-6.333126718, -12.7), (-5.825126718, -12.192), (-5.317126718, -12.7))
            Line((-5.317126718, -12.7), (-4.287512407, -12.7))
            ThreePointArc((-4.287512407, -12.7), (-3.54574862, -12.39275138), (-3.2385, -11.650987593))
            Line((-3.2385, -11.650987593), (-3.2385, -11.539212407))
            ThreePointArc((-3.2385, -11.539212407), (-3.54574862, -10.79744862), (-4.287512407, -10.4902))
            Line((-4.287512407, -10.4902), (-6.416408329, -10.4902))
            ThreePointArc((-6.416408329, -10.4902), (-7.41473083, -9.822813117), (-7.179650497, -8.645192506))
        make_face()
        Circle(SKETCH1_R, mode=Mode.SUBTRACT)
    extrude(amount=BOSS_EXTRUDE1_DEPTH, both=True)

    # Sketch2 → Cut-Extrude1 (cut, through all)
    with BuildSketch(Plane(origin=(0, 12.7, 0), x_dir=(1, 0, 0), z_dir=(0, 1, 0))):
        Polygon((12.7, -190.5), (-12.7, -190.5), (-12.7, -125.571593893), (12.7, -104.831193661), align=None)
    extrude(amount=-CUT_EXTRUDE1_DEPTH, mode=Mode.SUBTRACT)


solid = part.part
